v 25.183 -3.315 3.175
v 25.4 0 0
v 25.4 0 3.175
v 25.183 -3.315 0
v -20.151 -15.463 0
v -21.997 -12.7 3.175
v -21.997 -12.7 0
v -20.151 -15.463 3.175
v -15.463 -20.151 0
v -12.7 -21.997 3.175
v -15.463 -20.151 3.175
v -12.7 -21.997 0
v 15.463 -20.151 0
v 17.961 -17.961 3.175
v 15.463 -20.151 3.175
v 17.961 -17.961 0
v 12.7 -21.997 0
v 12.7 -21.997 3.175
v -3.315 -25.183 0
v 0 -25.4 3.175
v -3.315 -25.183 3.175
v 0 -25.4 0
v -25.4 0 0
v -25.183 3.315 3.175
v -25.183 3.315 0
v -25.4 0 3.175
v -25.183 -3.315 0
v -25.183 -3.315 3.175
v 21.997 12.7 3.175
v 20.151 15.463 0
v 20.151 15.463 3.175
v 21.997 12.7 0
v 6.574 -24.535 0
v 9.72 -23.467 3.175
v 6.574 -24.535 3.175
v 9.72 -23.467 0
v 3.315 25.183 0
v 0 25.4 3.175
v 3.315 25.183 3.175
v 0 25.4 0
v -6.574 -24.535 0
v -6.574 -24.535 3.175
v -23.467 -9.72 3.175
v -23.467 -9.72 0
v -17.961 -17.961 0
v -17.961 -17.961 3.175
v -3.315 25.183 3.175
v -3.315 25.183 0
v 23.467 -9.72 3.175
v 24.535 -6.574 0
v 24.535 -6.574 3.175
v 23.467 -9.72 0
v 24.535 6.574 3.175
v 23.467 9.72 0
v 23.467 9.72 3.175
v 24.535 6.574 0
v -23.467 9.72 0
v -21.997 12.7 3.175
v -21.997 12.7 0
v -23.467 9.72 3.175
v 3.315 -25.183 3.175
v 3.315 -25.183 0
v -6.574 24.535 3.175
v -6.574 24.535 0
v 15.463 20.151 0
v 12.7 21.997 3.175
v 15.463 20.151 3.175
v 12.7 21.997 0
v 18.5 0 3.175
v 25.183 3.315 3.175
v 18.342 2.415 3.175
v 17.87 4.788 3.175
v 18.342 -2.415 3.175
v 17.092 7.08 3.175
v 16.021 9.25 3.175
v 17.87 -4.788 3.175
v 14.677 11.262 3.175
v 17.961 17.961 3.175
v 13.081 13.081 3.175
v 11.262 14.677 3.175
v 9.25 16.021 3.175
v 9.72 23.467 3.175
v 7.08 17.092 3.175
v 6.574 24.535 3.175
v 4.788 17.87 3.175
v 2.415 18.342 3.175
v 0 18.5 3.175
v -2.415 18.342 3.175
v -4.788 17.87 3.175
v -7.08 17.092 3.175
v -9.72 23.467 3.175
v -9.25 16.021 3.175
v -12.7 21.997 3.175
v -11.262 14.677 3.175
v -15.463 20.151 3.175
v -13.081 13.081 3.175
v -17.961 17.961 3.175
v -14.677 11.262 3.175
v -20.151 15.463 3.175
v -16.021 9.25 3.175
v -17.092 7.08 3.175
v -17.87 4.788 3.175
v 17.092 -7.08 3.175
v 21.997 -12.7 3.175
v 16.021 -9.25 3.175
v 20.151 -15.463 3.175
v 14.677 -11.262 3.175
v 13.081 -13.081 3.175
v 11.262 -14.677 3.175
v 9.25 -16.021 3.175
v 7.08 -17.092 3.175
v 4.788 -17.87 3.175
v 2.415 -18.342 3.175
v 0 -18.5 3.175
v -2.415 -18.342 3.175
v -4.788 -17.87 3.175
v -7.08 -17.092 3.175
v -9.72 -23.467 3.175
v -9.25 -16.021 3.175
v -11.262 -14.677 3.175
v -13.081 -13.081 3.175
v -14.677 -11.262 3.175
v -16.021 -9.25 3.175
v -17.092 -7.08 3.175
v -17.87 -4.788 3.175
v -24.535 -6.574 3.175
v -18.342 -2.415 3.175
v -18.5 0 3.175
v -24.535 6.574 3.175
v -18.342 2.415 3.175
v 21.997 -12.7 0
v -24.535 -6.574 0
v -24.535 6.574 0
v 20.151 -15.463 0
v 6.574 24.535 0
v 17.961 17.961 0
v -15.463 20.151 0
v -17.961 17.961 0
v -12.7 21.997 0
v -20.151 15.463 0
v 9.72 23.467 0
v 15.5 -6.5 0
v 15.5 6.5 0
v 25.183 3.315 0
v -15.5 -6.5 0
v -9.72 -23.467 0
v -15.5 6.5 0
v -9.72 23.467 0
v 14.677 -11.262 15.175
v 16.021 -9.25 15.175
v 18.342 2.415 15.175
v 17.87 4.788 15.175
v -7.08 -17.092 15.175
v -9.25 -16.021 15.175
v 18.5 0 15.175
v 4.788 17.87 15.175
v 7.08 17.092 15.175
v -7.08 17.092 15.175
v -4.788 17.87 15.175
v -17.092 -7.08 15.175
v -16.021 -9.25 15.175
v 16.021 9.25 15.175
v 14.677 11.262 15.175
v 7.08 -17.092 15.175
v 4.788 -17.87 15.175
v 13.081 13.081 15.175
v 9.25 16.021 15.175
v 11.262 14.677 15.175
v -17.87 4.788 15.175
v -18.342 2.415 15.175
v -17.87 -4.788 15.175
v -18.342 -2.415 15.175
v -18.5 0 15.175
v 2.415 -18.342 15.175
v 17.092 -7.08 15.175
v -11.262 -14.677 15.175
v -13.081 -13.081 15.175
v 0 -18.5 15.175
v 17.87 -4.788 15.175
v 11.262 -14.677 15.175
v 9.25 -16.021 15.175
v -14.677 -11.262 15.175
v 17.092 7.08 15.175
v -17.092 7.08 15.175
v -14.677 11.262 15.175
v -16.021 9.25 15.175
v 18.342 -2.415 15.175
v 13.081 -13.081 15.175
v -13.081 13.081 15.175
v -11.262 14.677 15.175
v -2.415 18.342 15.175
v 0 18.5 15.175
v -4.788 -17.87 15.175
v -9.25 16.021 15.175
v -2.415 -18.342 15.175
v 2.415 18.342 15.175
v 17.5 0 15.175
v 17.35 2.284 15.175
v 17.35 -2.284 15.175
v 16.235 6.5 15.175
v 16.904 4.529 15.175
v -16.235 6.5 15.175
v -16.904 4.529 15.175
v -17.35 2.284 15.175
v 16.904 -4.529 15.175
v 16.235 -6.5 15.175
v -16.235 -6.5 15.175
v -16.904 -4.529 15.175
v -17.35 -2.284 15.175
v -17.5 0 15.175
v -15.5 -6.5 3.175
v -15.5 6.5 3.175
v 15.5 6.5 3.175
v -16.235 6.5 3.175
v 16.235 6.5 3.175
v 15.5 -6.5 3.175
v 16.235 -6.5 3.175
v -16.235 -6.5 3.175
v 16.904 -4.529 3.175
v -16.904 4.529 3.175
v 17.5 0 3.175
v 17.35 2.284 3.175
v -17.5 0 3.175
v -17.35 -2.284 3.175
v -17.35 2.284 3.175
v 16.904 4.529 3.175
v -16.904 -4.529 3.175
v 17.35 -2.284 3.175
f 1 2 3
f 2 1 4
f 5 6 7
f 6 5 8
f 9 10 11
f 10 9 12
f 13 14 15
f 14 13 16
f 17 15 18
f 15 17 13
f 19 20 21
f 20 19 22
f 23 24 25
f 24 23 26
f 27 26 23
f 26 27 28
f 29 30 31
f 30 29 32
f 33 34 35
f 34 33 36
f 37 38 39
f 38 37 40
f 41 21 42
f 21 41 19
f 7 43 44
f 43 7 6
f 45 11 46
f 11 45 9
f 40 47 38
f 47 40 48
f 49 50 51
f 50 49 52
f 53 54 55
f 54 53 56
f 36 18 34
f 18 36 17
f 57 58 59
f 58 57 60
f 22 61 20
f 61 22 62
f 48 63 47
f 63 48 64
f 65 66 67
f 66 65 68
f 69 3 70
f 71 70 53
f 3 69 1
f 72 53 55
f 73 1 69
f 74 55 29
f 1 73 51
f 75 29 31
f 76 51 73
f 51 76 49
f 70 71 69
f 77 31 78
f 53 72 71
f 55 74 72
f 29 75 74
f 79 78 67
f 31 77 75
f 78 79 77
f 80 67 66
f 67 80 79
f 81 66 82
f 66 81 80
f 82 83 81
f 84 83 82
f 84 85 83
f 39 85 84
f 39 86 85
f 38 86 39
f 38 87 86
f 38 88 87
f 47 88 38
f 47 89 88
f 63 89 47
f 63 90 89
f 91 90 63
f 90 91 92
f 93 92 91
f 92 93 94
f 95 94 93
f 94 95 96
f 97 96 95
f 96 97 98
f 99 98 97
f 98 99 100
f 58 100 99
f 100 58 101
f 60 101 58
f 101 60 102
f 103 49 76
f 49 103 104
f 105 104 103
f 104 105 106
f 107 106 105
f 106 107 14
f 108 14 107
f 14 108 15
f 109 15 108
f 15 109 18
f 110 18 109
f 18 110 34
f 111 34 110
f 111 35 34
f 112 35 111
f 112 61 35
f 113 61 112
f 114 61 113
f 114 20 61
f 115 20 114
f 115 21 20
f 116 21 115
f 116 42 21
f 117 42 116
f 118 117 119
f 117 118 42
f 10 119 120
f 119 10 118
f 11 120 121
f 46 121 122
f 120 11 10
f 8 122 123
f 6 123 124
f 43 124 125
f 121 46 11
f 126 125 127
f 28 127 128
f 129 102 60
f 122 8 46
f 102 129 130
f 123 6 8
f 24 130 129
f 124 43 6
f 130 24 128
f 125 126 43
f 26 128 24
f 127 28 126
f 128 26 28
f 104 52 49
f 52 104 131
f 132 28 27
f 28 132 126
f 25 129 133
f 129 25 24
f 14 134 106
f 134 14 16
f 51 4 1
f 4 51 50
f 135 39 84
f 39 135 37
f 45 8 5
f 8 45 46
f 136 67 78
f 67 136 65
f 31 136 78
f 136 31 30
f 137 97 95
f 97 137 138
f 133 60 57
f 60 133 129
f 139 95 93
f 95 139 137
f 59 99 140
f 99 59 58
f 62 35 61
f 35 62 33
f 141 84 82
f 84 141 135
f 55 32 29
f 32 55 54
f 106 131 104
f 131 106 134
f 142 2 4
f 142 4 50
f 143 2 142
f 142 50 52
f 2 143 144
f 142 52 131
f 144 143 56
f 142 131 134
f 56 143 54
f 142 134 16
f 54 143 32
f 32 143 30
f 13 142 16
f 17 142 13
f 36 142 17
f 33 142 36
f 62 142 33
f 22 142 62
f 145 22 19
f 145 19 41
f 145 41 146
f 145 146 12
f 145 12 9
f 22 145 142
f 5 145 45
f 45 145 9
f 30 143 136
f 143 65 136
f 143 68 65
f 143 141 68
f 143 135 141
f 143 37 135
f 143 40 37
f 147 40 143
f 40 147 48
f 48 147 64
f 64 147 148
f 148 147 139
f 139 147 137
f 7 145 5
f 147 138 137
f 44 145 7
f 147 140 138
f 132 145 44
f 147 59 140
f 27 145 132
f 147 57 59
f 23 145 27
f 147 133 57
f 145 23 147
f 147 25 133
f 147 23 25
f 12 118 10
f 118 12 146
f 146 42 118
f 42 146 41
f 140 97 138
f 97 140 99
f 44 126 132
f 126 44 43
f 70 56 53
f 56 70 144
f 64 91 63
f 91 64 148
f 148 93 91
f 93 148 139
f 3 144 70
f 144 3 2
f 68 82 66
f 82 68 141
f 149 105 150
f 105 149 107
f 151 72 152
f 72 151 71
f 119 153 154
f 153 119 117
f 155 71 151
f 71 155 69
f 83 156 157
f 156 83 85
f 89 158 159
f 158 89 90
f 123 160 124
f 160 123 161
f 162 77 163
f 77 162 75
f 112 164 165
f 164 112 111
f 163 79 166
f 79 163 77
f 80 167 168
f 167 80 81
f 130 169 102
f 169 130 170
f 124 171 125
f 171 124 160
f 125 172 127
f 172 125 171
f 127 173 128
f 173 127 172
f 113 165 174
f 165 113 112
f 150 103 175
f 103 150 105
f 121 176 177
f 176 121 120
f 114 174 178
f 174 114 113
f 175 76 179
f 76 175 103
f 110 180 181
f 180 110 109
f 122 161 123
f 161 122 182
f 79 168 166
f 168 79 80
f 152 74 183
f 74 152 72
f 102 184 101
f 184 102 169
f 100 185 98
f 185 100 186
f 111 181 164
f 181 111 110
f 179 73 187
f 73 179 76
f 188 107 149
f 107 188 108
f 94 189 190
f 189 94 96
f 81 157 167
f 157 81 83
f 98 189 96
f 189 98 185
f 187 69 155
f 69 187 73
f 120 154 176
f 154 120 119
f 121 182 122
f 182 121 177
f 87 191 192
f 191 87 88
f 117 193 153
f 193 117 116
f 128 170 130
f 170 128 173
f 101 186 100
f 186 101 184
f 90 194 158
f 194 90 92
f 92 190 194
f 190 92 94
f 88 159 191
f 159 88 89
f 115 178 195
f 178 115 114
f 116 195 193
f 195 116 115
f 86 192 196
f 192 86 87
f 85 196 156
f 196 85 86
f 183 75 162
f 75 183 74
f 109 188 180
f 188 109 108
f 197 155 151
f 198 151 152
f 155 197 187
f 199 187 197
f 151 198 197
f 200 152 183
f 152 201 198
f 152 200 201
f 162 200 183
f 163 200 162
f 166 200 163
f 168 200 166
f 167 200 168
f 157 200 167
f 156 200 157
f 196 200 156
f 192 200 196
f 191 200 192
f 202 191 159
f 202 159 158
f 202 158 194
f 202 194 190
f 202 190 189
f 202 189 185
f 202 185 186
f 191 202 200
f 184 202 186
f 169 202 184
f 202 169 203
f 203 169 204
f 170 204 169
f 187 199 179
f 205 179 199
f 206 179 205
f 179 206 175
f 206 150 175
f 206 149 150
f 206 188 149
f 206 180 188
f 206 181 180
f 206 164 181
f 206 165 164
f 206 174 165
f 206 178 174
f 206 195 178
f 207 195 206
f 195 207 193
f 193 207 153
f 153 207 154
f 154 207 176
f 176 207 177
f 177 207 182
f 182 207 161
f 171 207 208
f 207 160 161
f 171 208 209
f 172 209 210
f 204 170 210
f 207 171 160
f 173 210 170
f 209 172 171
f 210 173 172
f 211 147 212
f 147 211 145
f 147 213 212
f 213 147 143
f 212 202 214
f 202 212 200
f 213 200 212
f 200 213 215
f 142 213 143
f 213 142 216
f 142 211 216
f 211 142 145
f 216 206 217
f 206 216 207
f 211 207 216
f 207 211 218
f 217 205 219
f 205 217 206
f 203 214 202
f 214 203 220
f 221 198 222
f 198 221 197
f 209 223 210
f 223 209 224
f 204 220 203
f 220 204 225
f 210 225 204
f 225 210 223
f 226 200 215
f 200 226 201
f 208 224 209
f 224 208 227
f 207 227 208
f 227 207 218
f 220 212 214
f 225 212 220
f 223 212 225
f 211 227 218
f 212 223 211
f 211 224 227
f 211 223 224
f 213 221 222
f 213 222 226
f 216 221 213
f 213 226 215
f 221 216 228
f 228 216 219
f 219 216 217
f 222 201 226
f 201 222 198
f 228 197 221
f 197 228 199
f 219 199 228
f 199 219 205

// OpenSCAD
// Adapter so that the 3-way (a-b c, a b-c, a b c) switches I bought from DigiKey years ago
// (TODO: link might be nice) can be put into a round hole.
// 
// Dimensions of the switch:
// Flange : 31.7mm x 16.4mm (long dimension is about 1+1/4")
// Shaft  : 30.7mm x 12.0mm (clips maximally squshed by my calipers)
// Shaft extends 18.3mm down, and contacts extend 28.3mm below the bottom of the flange

diagonal = 33;

// inset = 2;
flange_thickness = 3.175;
flange_diameter  = 50.8;
// flange_inner_diameter  = 36;
shaft_length     = 12;
shaft_diameter   = 37; // For a 1.5" hole
shaft_inner_diameter = 35;

$fn = 48;

module panel_hole() {
	square([31, 13], center=true);
}
module shaft_hole() {
	intersection() {
		square([shaft_diameter, 13], center=true);
		circle(d=shaft_inner_diameter);
	}
	
}

total_height = flange_thickness+shaft_length;

difference() {
	union() {
		if(flange_thickness > 0) linear_extrude(flange_thickness) circle(d=flange_diameter);
		translate([0,0,flange_thickness]) linear_extrude(shaft_length) difference() {
			circle(d=shaft_diameter);
			// circle(d=shaft_inner_diameter);
		}
	}
	
	linear_extrude(total_height*3, center=true) panel_hole();
	translate([0,0,flange_thickness]) linear_extrude(total_height) shaft_hole();
}
